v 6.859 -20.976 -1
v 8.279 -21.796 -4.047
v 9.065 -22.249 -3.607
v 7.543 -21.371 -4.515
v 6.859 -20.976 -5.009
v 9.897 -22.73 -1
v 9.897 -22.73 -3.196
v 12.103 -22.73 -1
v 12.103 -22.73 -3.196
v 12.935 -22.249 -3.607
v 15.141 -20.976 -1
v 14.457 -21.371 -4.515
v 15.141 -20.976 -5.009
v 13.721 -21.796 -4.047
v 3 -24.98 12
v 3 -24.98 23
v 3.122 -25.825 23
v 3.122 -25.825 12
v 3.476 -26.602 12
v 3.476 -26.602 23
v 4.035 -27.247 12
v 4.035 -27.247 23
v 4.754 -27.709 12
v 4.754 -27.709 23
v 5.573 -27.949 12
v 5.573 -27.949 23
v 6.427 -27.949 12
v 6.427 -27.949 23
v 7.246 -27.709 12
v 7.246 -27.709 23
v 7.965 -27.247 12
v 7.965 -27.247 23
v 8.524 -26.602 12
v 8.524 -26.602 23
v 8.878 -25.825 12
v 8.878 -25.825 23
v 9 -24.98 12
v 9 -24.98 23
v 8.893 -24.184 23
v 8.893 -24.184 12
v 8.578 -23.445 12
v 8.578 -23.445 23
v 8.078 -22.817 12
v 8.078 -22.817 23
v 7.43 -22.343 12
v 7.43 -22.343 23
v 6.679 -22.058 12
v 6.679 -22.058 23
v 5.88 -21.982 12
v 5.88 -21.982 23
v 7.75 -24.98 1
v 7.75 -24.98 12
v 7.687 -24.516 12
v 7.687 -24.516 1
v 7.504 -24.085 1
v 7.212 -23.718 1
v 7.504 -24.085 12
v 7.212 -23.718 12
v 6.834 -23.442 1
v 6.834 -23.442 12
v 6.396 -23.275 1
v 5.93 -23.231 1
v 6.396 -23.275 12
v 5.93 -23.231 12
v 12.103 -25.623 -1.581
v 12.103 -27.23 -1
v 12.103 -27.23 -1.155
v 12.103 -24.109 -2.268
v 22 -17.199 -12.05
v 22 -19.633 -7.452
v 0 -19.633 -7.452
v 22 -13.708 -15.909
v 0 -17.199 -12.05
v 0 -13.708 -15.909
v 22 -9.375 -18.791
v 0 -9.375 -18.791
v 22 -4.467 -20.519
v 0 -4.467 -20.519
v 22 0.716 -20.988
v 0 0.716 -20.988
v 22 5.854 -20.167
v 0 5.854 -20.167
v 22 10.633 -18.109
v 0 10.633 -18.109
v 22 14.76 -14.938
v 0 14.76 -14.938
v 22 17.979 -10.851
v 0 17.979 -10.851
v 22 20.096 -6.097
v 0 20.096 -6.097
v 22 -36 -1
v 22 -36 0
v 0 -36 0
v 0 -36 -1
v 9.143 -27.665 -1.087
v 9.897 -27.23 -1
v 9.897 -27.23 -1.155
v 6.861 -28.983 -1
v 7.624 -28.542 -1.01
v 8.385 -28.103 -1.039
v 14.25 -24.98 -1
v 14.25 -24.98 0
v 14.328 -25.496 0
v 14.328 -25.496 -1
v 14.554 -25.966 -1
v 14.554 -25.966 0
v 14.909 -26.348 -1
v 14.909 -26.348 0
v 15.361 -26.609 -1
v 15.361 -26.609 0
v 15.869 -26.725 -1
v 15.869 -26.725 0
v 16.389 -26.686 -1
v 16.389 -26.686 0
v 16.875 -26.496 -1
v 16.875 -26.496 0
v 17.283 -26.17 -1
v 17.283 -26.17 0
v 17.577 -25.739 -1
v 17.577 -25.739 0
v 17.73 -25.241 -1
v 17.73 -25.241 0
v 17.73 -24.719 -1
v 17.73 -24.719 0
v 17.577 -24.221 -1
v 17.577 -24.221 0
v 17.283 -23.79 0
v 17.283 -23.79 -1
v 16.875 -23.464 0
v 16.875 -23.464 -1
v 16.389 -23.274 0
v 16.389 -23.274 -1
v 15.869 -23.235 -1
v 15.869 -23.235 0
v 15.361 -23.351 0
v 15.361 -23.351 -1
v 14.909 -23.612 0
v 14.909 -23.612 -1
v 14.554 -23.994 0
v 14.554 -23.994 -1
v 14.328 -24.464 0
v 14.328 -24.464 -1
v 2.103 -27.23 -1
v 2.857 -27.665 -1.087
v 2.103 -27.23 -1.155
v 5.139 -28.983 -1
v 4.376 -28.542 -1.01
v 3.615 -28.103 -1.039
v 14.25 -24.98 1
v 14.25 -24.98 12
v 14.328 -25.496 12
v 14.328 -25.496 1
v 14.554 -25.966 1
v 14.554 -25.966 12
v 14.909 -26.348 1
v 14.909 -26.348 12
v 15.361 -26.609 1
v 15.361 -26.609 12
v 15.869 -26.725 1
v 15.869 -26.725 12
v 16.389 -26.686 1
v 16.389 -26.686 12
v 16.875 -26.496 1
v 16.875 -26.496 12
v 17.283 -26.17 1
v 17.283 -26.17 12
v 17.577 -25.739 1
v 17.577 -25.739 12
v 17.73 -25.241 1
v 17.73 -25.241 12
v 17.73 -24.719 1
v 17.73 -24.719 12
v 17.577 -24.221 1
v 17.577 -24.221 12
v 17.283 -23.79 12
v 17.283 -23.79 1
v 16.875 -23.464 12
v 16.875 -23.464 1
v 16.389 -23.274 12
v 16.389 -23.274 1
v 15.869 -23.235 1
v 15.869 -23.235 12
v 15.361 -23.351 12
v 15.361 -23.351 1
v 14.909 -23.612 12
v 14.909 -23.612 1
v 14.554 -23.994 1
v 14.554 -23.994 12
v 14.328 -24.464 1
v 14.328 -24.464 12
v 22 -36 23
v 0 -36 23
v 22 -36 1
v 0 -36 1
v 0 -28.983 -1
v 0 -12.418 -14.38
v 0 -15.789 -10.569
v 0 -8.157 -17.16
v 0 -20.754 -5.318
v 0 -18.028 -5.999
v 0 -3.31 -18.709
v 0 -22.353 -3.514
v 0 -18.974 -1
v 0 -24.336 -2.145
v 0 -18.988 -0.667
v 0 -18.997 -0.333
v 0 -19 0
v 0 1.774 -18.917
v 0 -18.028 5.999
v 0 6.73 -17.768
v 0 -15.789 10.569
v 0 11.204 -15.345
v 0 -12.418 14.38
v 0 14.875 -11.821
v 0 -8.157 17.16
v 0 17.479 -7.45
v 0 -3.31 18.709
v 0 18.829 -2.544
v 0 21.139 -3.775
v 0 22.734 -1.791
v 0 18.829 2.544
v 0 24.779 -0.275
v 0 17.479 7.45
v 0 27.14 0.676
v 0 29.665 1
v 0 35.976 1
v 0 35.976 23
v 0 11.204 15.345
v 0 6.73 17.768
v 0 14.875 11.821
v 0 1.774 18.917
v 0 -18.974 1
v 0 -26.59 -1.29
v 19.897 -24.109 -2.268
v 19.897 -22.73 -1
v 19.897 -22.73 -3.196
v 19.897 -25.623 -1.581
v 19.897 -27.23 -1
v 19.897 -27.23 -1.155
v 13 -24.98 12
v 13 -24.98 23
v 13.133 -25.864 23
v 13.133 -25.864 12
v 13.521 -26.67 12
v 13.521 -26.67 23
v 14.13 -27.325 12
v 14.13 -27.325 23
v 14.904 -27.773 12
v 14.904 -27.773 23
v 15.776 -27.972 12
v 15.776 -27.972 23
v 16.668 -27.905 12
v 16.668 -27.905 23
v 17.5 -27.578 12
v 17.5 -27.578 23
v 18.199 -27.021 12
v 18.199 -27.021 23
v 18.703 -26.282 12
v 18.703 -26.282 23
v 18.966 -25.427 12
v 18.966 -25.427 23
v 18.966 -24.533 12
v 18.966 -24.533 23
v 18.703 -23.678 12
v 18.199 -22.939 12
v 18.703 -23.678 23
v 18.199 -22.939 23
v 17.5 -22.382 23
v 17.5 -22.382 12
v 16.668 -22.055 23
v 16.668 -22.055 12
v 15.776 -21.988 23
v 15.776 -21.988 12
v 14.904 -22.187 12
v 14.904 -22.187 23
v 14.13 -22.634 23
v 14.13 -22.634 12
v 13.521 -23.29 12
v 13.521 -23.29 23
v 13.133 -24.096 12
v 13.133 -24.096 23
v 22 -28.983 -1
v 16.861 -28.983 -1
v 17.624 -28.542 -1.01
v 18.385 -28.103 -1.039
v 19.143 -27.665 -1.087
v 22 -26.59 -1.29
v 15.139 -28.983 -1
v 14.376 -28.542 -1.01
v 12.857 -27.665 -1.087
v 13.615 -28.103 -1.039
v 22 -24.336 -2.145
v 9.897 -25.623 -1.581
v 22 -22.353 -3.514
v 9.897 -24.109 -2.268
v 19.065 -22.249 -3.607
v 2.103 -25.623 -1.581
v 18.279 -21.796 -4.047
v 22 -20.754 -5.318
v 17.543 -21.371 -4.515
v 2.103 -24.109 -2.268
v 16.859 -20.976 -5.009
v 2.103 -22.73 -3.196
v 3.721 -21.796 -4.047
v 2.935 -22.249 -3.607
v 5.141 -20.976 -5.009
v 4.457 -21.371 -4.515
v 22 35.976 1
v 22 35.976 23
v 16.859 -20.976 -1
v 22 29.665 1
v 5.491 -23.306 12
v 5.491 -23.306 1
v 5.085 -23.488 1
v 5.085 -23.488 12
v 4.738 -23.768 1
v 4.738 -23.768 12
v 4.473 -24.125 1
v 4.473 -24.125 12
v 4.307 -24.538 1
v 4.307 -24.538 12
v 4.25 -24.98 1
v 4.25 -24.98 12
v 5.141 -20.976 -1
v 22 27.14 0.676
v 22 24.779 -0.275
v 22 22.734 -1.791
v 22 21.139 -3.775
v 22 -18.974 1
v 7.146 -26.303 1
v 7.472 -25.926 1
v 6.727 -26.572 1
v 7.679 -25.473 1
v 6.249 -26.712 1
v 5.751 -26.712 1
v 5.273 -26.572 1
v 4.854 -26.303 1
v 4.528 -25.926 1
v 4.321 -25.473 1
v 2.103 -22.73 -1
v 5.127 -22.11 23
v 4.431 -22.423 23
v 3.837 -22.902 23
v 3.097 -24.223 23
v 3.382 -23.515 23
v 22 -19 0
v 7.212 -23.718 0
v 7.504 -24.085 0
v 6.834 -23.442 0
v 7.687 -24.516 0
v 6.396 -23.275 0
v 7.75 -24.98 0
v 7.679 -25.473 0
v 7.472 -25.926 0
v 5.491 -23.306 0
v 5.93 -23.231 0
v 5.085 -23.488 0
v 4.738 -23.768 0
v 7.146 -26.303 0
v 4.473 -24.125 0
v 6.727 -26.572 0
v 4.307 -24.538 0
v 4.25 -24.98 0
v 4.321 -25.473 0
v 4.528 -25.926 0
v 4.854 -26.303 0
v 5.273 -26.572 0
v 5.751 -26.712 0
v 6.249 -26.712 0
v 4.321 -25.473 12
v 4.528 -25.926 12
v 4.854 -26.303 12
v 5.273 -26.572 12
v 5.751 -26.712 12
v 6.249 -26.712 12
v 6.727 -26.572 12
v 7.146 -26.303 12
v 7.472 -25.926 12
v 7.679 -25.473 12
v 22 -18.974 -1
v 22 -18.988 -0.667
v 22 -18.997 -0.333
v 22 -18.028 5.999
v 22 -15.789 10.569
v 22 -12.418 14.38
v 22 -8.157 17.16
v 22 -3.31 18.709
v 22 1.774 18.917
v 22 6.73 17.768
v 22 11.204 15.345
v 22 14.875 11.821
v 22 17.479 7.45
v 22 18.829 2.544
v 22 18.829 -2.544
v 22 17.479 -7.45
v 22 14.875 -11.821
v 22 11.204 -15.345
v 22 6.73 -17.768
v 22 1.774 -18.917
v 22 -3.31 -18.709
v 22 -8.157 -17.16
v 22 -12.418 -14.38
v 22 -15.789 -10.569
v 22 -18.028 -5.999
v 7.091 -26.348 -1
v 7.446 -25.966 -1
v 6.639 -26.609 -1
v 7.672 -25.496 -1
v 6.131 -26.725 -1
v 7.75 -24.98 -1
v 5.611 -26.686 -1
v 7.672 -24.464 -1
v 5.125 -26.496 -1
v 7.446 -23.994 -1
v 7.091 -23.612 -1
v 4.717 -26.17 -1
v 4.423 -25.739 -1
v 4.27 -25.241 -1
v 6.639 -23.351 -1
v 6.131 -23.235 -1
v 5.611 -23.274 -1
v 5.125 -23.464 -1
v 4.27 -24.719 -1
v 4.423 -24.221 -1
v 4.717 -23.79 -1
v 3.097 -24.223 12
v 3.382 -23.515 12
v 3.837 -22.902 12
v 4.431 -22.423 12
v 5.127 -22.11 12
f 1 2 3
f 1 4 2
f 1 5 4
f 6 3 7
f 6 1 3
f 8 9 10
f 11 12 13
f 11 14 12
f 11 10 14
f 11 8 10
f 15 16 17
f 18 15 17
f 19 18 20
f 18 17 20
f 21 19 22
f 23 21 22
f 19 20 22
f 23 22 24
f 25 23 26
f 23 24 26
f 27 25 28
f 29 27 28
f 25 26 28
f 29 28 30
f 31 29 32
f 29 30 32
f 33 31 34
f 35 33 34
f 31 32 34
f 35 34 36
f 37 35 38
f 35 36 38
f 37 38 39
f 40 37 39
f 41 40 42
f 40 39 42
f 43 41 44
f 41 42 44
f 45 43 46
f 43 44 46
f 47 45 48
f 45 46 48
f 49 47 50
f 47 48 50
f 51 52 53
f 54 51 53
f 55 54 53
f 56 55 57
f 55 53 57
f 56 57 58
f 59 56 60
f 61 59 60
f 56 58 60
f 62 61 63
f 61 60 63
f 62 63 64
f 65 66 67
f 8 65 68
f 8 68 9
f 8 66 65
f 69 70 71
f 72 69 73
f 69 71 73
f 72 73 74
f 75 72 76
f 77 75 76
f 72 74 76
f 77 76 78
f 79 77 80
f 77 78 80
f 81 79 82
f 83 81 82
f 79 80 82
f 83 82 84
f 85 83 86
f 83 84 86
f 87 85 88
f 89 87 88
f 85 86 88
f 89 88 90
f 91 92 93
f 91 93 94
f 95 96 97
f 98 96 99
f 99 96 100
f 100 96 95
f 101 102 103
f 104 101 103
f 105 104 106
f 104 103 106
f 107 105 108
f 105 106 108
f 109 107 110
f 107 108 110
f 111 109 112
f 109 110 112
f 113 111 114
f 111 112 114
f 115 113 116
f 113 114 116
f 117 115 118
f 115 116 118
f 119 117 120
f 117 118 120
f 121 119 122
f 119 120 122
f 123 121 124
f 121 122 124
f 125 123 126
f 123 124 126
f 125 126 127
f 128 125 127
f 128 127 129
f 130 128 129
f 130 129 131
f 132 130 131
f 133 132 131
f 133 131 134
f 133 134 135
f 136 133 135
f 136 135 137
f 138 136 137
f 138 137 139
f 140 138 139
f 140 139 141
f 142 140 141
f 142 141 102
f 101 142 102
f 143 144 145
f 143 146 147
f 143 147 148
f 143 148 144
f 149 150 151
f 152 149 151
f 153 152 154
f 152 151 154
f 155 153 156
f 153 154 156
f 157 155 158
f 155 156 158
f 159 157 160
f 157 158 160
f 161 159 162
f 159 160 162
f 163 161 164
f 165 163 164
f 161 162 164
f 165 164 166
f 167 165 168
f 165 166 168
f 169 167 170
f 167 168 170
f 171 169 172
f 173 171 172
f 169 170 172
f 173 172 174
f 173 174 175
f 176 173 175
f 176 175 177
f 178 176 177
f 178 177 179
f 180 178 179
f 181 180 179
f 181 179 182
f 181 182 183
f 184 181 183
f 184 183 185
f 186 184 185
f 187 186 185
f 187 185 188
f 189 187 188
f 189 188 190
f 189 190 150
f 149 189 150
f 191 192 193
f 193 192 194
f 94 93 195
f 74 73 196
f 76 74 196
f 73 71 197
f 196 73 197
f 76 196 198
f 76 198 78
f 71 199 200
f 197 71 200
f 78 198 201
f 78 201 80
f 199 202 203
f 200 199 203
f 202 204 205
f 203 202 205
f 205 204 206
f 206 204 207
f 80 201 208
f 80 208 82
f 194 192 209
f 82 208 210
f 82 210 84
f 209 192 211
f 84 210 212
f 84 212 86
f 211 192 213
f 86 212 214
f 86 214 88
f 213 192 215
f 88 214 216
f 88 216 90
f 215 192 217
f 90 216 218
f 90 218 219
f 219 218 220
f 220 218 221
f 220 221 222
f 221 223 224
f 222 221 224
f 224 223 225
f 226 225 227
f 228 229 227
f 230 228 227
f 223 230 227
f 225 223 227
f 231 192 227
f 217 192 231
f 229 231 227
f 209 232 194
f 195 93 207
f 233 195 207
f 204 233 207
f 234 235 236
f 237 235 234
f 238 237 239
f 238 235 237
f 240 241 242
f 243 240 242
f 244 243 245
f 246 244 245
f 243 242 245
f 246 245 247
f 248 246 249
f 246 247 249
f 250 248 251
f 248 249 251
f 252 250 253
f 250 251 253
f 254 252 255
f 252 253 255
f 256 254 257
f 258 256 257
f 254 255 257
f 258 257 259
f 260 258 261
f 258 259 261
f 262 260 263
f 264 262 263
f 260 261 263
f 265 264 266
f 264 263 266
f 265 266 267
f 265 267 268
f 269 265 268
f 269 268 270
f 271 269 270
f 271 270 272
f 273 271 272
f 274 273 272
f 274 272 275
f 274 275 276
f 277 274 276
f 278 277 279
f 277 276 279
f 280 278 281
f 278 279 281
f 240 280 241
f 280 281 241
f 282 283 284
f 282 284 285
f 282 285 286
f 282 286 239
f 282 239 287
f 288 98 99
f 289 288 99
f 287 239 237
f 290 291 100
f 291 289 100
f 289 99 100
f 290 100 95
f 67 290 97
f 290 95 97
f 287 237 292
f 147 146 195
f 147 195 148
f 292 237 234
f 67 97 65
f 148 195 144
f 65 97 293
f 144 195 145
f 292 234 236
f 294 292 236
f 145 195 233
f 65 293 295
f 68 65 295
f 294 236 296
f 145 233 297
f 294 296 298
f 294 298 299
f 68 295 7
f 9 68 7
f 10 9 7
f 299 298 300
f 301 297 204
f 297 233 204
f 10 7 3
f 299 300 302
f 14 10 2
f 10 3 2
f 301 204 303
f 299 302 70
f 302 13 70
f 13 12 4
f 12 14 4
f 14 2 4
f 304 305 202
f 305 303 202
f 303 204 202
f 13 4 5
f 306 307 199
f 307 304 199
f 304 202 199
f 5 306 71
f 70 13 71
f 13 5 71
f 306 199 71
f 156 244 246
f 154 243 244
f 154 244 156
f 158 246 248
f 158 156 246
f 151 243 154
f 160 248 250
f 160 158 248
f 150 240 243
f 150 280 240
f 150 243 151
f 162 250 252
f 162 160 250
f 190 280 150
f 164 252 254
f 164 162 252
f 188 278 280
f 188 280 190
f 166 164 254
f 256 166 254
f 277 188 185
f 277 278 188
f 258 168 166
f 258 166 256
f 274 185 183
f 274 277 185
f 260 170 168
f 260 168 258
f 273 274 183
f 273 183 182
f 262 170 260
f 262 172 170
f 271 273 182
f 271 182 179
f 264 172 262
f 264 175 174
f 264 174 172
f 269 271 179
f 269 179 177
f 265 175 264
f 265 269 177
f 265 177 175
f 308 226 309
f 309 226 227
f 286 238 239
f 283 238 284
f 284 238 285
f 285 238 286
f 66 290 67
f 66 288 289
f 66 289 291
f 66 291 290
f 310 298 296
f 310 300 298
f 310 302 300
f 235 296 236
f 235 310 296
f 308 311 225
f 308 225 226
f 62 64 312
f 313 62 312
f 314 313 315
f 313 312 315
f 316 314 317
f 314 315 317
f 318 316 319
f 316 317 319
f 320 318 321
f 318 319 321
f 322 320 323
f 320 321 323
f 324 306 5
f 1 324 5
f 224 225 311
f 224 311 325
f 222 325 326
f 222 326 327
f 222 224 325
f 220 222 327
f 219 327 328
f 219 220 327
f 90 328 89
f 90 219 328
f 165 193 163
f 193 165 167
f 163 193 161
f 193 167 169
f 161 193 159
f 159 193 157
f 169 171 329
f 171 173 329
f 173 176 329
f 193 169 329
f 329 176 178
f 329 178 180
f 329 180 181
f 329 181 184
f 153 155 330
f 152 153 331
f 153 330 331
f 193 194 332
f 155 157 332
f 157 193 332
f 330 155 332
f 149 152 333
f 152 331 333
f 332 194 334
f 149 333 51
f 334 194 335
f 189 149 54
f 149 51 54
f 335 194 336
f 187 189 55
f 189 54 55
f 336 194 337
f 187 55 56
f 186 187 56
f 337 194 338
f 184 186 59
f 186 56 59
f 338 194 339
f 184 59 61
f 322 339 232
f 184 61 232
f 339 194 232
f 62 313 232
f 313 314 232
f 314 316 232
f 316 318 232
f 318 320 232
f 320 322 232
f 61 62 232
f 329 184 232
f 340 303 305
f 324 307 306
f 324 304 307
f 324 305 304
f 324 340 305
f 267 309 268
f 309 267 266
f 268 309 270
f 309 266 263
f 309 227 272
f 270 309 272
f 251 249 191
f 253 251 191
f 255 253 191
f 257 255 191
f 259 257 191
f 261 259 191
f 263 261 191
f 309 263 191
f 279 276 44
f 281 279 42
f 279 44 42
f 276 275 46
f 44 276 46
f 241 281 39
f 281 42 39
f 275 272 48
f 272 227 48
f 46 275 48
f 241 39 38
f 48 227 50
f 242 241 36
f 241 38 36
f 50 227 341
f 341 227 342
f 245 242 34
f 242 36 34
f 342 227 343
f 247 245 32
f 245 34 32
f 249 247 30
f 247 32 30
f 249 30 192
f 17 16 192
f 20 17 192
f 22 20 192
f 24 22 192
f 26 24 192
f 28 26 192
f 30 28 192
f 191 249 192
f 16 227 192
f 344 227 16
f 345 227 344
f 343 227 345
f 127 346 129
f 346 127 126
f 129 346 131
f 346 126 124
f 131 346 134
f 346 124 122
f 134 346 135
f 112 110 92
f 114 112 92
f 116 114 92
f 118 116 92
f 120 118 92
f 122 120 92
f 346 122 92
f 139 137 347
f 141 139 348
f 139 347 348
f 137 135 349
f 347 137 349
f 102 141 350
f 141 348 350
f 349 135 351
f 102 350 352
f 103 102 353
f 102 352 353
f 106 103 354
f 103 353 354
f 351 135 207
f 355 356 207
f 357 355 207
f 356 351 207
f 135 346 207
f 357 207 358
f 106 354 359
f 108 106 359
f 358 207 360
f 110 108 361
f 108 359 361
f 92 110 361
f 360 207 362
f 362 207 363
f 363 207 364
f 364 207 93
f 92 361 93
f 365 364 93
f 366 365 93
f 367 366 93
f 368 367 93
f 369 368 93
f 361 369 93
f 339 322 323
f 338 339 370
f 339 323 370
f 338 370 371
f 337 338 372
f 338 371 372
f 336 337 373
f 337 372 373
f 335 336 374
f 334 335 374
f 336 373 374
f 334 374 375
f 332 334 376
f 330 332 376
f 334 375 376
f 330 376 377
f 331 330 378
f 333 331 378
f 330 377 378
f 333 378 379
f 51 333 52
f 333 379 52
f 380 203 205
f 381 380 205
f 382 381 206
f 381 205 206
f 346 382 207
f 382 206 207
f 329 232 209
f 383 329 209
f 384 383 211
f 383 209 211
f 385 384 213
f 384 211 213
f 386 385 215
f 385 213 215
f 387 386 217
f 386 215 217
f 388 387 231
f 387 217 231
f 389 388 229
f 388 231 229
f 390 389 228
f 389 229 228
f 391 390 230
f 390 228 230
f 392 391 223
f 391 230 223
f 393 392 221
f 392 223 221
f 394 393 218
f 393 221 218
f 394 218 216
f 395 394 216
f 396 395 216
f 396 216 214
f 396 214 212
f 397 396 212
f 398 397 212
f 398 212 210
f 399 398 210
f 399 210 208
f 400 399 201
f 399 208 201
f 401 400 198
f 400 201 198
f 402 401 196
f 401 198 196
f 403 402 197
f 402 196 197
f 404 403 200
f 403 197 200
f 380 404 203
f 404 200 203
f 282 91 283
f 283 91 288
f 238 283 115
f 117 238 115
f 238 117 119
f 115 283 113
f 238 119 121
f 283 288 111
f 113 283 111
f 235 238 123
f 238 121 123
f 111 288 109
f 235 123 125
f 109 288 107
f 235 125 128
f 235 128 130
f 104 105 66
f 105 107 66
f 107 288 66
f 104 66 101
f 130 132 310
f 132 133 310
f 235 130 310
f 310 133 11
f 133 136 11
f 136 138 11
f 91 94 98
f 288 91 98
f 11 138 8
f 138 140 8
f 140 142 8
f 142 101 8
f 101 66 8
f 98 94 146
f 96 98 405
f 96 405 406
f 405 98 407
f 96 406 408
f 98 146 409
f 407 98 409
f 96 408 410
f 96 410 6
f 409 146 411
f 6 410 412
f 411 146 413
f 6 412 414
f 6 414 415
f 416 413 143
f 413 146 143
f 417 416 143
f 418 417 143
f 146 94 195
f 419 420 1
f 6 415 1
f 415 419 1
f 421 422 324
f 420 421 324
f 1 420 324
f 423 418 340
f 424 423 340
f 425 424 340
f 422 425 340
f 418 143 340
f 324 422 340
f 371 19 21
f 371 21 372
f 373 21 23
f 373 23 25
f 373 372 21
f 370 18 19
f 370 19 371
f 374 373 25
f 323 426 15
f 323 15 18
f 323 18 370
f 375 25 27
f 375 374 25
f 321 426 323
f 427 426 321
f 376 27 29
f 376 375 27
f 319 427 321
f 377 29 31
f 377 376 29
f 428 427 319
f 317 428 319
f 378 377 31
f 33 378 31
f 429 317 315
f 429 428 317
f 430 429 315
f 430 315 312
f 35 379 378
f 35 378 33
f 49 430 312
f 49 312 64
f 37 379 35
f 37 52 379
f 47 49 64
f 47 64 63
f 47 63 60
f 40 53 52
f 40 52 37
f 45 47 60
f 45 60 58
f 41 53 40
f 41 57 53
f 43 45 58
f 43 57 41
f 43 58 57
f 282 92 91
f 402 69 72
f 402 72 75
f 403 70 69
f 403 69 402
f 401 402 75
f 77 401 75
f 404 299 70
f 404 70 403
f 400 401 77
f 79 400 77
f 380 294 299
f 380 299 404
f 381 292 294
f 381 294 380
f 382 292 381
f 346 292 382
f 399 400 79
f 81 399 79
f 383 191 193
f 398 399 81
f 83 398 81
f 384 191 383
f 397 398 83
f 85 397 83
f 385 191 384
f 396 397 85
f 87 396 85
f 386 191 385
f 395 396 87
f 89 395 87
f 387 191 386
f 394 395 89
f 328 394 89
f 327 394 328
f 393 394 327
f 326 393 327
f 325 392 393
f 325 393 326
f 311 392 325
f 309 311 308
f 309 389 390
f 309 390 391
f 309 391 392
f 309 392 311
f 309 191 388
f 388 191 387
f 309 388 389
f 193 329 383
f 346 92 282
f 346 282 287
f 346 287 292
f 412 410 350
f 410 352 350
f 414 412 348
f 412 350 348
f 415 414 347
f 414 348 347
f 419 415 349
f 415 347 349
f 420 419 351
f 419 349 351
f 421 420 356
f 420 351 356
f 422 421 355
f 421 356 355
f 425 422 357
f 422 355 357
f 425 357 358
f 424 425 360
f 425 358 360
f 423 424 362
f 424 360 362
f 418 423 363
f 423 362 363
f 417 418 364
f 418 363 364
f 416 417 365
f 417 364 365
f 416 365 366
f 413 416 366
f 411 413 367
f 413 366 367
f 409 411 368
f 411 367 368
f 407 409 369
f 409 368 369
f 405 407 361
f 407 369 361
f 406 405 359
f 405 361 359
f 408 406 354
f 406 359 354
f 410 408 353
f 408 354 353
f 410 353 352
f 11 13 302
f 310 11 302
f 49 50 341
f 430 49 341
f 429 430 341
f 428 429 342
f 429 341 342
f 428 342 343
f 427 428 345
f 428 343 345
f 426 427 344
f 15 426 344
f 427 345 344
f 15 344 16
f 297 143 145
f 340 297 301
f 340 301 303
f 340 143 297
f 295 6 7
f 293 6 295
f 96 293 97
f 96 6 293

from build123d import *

# Parameters (mm, degrees)
F1_DEPTH     = 22
F3_DEPTH     = 25
F4_DEPTH     = 11
F5_R         = 1.75
F6_DEPTH     = 20
F7_T1_DEPTH  = 22
F7_T6_DEPTH  = 22
F7_S7_R      = 1.75
F7_T8_DEPTH  = 14
F7_S9_R      = 1.75
F7_T10_DEPTH = 14


# Not quite as in the source:
# - a fillet or chamfer that OpenCascade refuses, or shapes differently, is made with other operations: its cross-section is extruded or revolved along the edge and cut away or added
# - after a boolean that leaves OpenCascade's solid faulty, fix() repairs it


with BuildPart() as f1:
    # F0 (on Right) → F1 (new body)
    with BuildSketch(Plane.YZ):
        with BuildLine():
            ThreePointArc((-20.9761769634, 1), (0, 21), (20.9761769634, 1))
            Line((20.9761769634, 1), (35.9761769634, 1))
            Line((35.9761769634, 1), (35.9761769634, 23))
            Line((35.9761769634, 23), (-36, 23))
            Line((-36, 23), (-36, 1))
            Line((-36, 1), (-20.9761769634, 1))
        make_face()
        with BuildLine():
            ThreePointArc((-18.973665961, -1), (-18.9934153493, -0.5001733404), (-19, 0))
            Line((-19, 0), (-21, 0))
            ThreePointArc((-21, 0), (-20.9940433961, -0.5001418641), (-20.9761769634, -1))
            Line((-20.9761769634, -1), (-18.973665961, -1))
        make_face()
        with BuildLine():
            ThreePointArc((18.973665961, 1), (1, -18.973665961), (-18.973665961, -1))
            Line((-18.973665961, -1), (-20.9761769634, -1))
            ThreePointArc((-20.9761769634, -1), (1, -20.9761769634), (20.9761769634, 1))
            Line((20.9761769634, 1), (18.973665961, 1))
        make_face()
        with BuildLine():
            ThreePointArc((-18.973665961, 1), (0, 19), (18.973665961, 1))
            Line((18.973665961, 1), (20.9761769634, 1))
            ThreePointArc((20.9761769634, 1), (0, 21), (-20.9761769634, 1))
            Line((-20.9761769634, 1), (-18.973665961, 1))
        make_face()
        with BuildLine():
            ThreePointArc((-20.9761769634, -1), (-20.9940433961, -0.5001418641), (-21, 0))
            Line((-21, 0), (-36, 0))
            Line((-36, 0), (-36, -1))
            Line((-36, -1), (-20.9761769634, -1))
        make_face()
    extrude(amount=F1_DEPTH)

    # F2 (on face) → F3 (cut)
    with BuildSketch(Plane.XY.offset(23)):
        with BuildLine():
            ThreePointArc((4.25, -24.9799919936), (6, -26.7299919936), (7.75, -24.9799919936))
            Line((7.75, -24.9799919936), (6, -24.9799919936))
            Line((6, -24.9799919936), (4.25, -24.9799919936))
        make_face()
        with BuildLine():
            Line((6, -24.9799919936), (5.93, -23.231392554))
            ThreePointArc((5.93, -23.231392554), (4.7380570536, -23.7675564283), (4.25, -24.9799919936))
            Line((4.25, -24.9799919936), (6, -24.9799919936))
        make_face()
        with BuildLine():
            Line((6, -24.9799919936), (7.75, -24.9799919936))
            ThreePointArc((7.75, -24.9799919936), (7.2124355653, -23.7180490472), (5.93, -23.231392554))
            Line((5.93, -23.231392554), (6, -24.9799919936))
        make_face()
        with BuildLine():
            ThreePointArc((17.75, -24.9799919936), (16, -23.2299919936), (14.25, -24.9799919936))
            ThreePointArc((14.25, -24.9799919936), (16, -26.7299919936), (17.75, -24.9799919936))
        make_face()
    extrude(amount=-F3_DEPTH, mode=Mode.SUBTRACT)

    # F2 (on face) → F4 (cut)
    with BuildSketch(Plane.XY.offset(23)):
        with BuildLine():
            Line((9, -24.9799919936), (7.75, -24.9799919936))
            ThreePointArc((7.75, -24.9799919936), (6, -26.7299919936), (4.25, -24.9799919936))
            Line((4.25, -24.9799919936), (3, -24.9799919936))
            ThreePointArc((3, -24.9799919936), (6, -27.9799919936), (9, -24.9799919936))
        make_face()
        with BuildLine():
            ThreePointArc((4.25, -24.9799919936), (4.7380570536, -23.7675564283), (5.93, -23.231392554))
            Line((5.93, -23.231392554), (5.88, -21.9823929544))
            ThreePointArc((5.88, -21.9823929544), (3.8366692347, -22.9015310245), (3, -24.9799919936))
            Line((3, -24.9799919936), (4.25, -24.9799919936))
        make_face()
        with BuildLine():
            ThreePointArc((5.93, -23.231392554), (7.2124355653, -23.7180490472), (7.75, -24.9799919936))
            Line((7.75, -24.9799919936), (9, -24.9799919936))
            ThreePointArc((9, -24.9799919936), (8.0784609691, -22.8166612283), (5.88, -21.9823929544))
            Line((5.88, -21.9823929544), (5.93, -23.231392554))
        make_face()
        with BuildLine():
            ThreePointArc((19, -24.9799919936), (16, -21.9799919936), (13, -24.9799919936))
            ThreePointArc((13, -24.9799919936), (16, -27.9799919936), (19, -24.9799919936))
        make_face()
        with BuildLine():
            ThreePointArc((17.75, -24.9799919936), (16, -26.7299919936), (14.25, -24.9799919936))
            ThreePointArc((14.25, -24.9799919936), (16, -23.2299919936), (17.75, -24.9799919936))
        make_face(mode=Mode.SUBTRACT)
    extrude(amount=-F4_DEPTH, mode=Mode.SUBTRACT)

    # F7: fillet of radius 10 on 2 edges, made by hand

    # F7_s2 → F7_t1 (join)
    with BuildSketch(Plane.YZ):
        with BuildLine():
            ThreePointArc((29.6647939484, 1), (23.7079599766, -0.967806711), (20.095505578, -6.0967741935))
            ThreePointArc((20.095505578, -6.0967741935), (20.8401494161, -2.5861500957), (20.9761769634, 1))
            Line((20.9761769634, 1), (29.6647939484, 1))
        make_face()
    extrude(amount=F7_T1_DEPTH)


with BuildPart() as f6:
    # F5 (on face) → F6 (new body)
    with BuildSketch(Plane(origin=(0, 0, -1), x_dir=(1, 0, 0), z_dir=(0, 0, -1))):
        Polygon((19.897114317, 27.2299919936), (16, 29.4799919936), (12.102885683, 27.2299919936), (12.102885683, 22.7299919936), (15.1405824223, 20.9761769634), (16.8594175777, 20.9761769634), (19.897114317, 22.7299919936), align=None)
        with Locations((16, 24.9799919936)):
            Circle(F5_R, mode=Mode.SUBTRACT)
    extrude(amount=F6_DEPTH)


with BuildPart() as f6b:
    # F5 (on face) → F6, piece 2 (new body)
    with BuildSketch(Plane(origin=(0, 0, -1), x_dir=(1, 0, 0), z_dir=(0, 0, -1))):
        Polygon((5.1405824223, 20.9761769634), (6.8594175777, 20.9761769634), (9.897114317, 22.7299919936), (9.897114317, 27.2299919936), (6, 29.4799919936), (2.102885683, 27.2299919936), (2.102885683, 22.7299919936), align=None)
        with Locations((6, 24.9799919936)):
            Circle(F5_R, mode=Mode.SUBTRACT)
    extrude(amount=F6_DEPTH)


with BuildPart() as f7_tool4:
    # F7_s5 → F7_t6 (new body)
    with BuildSketch(Plane.YZ):
        with BuildLine():
            ThreePointArc((-28.9827534924, -1), (-23.3031351499, -2.7694510825), (-19.6334781723, -7.4516129032))
            ThreePointArc((-19.6334781723, -7.4516129032), (-20.5594710492, -4.2788024233), (-20.9761769634, -1))
            Line((-20.9761769634, -1), (-28.9827534924, -1))
        make_face()
    extrude(amount=F7_T6_DEPTH)

    # F7_s7 → F7_t8 (cut, symmetric)
    with BuildSketch(Plane.XY.offset(-4.2)):
        with Locations((16, -24.9799919936)):
            Circle(F7_S7_R)
    extrude(amount=F7_T8_DEPTH, both=True, mode=Mode.SUBTRACT)

    # F7_s9 → F7_t10 (cut, symmetric)
    with BuildSketch(Plane.XY.offset(-4.2)):
        with Locations((6, -24.9799919936)):
            Circle(F7_S9_R)
    extrude(amount=F7_T10_DEPTH, both=True, mode=Mode.SUBTRACT)


with BuildPart() as f1_1:
    add(f1.part)

    # F7_t3: union F7_tool4
    add(f7_tool4.part)

    # F8: cut F6, F6b
    add(f6.part, mode=Mode.SUBTRACT)
    add(f6b.part, mode=Mode.SUBTRACT)

    add(f1_1.part.fix(), mode=Mode.REPLACE)


solid = f1_1.part
